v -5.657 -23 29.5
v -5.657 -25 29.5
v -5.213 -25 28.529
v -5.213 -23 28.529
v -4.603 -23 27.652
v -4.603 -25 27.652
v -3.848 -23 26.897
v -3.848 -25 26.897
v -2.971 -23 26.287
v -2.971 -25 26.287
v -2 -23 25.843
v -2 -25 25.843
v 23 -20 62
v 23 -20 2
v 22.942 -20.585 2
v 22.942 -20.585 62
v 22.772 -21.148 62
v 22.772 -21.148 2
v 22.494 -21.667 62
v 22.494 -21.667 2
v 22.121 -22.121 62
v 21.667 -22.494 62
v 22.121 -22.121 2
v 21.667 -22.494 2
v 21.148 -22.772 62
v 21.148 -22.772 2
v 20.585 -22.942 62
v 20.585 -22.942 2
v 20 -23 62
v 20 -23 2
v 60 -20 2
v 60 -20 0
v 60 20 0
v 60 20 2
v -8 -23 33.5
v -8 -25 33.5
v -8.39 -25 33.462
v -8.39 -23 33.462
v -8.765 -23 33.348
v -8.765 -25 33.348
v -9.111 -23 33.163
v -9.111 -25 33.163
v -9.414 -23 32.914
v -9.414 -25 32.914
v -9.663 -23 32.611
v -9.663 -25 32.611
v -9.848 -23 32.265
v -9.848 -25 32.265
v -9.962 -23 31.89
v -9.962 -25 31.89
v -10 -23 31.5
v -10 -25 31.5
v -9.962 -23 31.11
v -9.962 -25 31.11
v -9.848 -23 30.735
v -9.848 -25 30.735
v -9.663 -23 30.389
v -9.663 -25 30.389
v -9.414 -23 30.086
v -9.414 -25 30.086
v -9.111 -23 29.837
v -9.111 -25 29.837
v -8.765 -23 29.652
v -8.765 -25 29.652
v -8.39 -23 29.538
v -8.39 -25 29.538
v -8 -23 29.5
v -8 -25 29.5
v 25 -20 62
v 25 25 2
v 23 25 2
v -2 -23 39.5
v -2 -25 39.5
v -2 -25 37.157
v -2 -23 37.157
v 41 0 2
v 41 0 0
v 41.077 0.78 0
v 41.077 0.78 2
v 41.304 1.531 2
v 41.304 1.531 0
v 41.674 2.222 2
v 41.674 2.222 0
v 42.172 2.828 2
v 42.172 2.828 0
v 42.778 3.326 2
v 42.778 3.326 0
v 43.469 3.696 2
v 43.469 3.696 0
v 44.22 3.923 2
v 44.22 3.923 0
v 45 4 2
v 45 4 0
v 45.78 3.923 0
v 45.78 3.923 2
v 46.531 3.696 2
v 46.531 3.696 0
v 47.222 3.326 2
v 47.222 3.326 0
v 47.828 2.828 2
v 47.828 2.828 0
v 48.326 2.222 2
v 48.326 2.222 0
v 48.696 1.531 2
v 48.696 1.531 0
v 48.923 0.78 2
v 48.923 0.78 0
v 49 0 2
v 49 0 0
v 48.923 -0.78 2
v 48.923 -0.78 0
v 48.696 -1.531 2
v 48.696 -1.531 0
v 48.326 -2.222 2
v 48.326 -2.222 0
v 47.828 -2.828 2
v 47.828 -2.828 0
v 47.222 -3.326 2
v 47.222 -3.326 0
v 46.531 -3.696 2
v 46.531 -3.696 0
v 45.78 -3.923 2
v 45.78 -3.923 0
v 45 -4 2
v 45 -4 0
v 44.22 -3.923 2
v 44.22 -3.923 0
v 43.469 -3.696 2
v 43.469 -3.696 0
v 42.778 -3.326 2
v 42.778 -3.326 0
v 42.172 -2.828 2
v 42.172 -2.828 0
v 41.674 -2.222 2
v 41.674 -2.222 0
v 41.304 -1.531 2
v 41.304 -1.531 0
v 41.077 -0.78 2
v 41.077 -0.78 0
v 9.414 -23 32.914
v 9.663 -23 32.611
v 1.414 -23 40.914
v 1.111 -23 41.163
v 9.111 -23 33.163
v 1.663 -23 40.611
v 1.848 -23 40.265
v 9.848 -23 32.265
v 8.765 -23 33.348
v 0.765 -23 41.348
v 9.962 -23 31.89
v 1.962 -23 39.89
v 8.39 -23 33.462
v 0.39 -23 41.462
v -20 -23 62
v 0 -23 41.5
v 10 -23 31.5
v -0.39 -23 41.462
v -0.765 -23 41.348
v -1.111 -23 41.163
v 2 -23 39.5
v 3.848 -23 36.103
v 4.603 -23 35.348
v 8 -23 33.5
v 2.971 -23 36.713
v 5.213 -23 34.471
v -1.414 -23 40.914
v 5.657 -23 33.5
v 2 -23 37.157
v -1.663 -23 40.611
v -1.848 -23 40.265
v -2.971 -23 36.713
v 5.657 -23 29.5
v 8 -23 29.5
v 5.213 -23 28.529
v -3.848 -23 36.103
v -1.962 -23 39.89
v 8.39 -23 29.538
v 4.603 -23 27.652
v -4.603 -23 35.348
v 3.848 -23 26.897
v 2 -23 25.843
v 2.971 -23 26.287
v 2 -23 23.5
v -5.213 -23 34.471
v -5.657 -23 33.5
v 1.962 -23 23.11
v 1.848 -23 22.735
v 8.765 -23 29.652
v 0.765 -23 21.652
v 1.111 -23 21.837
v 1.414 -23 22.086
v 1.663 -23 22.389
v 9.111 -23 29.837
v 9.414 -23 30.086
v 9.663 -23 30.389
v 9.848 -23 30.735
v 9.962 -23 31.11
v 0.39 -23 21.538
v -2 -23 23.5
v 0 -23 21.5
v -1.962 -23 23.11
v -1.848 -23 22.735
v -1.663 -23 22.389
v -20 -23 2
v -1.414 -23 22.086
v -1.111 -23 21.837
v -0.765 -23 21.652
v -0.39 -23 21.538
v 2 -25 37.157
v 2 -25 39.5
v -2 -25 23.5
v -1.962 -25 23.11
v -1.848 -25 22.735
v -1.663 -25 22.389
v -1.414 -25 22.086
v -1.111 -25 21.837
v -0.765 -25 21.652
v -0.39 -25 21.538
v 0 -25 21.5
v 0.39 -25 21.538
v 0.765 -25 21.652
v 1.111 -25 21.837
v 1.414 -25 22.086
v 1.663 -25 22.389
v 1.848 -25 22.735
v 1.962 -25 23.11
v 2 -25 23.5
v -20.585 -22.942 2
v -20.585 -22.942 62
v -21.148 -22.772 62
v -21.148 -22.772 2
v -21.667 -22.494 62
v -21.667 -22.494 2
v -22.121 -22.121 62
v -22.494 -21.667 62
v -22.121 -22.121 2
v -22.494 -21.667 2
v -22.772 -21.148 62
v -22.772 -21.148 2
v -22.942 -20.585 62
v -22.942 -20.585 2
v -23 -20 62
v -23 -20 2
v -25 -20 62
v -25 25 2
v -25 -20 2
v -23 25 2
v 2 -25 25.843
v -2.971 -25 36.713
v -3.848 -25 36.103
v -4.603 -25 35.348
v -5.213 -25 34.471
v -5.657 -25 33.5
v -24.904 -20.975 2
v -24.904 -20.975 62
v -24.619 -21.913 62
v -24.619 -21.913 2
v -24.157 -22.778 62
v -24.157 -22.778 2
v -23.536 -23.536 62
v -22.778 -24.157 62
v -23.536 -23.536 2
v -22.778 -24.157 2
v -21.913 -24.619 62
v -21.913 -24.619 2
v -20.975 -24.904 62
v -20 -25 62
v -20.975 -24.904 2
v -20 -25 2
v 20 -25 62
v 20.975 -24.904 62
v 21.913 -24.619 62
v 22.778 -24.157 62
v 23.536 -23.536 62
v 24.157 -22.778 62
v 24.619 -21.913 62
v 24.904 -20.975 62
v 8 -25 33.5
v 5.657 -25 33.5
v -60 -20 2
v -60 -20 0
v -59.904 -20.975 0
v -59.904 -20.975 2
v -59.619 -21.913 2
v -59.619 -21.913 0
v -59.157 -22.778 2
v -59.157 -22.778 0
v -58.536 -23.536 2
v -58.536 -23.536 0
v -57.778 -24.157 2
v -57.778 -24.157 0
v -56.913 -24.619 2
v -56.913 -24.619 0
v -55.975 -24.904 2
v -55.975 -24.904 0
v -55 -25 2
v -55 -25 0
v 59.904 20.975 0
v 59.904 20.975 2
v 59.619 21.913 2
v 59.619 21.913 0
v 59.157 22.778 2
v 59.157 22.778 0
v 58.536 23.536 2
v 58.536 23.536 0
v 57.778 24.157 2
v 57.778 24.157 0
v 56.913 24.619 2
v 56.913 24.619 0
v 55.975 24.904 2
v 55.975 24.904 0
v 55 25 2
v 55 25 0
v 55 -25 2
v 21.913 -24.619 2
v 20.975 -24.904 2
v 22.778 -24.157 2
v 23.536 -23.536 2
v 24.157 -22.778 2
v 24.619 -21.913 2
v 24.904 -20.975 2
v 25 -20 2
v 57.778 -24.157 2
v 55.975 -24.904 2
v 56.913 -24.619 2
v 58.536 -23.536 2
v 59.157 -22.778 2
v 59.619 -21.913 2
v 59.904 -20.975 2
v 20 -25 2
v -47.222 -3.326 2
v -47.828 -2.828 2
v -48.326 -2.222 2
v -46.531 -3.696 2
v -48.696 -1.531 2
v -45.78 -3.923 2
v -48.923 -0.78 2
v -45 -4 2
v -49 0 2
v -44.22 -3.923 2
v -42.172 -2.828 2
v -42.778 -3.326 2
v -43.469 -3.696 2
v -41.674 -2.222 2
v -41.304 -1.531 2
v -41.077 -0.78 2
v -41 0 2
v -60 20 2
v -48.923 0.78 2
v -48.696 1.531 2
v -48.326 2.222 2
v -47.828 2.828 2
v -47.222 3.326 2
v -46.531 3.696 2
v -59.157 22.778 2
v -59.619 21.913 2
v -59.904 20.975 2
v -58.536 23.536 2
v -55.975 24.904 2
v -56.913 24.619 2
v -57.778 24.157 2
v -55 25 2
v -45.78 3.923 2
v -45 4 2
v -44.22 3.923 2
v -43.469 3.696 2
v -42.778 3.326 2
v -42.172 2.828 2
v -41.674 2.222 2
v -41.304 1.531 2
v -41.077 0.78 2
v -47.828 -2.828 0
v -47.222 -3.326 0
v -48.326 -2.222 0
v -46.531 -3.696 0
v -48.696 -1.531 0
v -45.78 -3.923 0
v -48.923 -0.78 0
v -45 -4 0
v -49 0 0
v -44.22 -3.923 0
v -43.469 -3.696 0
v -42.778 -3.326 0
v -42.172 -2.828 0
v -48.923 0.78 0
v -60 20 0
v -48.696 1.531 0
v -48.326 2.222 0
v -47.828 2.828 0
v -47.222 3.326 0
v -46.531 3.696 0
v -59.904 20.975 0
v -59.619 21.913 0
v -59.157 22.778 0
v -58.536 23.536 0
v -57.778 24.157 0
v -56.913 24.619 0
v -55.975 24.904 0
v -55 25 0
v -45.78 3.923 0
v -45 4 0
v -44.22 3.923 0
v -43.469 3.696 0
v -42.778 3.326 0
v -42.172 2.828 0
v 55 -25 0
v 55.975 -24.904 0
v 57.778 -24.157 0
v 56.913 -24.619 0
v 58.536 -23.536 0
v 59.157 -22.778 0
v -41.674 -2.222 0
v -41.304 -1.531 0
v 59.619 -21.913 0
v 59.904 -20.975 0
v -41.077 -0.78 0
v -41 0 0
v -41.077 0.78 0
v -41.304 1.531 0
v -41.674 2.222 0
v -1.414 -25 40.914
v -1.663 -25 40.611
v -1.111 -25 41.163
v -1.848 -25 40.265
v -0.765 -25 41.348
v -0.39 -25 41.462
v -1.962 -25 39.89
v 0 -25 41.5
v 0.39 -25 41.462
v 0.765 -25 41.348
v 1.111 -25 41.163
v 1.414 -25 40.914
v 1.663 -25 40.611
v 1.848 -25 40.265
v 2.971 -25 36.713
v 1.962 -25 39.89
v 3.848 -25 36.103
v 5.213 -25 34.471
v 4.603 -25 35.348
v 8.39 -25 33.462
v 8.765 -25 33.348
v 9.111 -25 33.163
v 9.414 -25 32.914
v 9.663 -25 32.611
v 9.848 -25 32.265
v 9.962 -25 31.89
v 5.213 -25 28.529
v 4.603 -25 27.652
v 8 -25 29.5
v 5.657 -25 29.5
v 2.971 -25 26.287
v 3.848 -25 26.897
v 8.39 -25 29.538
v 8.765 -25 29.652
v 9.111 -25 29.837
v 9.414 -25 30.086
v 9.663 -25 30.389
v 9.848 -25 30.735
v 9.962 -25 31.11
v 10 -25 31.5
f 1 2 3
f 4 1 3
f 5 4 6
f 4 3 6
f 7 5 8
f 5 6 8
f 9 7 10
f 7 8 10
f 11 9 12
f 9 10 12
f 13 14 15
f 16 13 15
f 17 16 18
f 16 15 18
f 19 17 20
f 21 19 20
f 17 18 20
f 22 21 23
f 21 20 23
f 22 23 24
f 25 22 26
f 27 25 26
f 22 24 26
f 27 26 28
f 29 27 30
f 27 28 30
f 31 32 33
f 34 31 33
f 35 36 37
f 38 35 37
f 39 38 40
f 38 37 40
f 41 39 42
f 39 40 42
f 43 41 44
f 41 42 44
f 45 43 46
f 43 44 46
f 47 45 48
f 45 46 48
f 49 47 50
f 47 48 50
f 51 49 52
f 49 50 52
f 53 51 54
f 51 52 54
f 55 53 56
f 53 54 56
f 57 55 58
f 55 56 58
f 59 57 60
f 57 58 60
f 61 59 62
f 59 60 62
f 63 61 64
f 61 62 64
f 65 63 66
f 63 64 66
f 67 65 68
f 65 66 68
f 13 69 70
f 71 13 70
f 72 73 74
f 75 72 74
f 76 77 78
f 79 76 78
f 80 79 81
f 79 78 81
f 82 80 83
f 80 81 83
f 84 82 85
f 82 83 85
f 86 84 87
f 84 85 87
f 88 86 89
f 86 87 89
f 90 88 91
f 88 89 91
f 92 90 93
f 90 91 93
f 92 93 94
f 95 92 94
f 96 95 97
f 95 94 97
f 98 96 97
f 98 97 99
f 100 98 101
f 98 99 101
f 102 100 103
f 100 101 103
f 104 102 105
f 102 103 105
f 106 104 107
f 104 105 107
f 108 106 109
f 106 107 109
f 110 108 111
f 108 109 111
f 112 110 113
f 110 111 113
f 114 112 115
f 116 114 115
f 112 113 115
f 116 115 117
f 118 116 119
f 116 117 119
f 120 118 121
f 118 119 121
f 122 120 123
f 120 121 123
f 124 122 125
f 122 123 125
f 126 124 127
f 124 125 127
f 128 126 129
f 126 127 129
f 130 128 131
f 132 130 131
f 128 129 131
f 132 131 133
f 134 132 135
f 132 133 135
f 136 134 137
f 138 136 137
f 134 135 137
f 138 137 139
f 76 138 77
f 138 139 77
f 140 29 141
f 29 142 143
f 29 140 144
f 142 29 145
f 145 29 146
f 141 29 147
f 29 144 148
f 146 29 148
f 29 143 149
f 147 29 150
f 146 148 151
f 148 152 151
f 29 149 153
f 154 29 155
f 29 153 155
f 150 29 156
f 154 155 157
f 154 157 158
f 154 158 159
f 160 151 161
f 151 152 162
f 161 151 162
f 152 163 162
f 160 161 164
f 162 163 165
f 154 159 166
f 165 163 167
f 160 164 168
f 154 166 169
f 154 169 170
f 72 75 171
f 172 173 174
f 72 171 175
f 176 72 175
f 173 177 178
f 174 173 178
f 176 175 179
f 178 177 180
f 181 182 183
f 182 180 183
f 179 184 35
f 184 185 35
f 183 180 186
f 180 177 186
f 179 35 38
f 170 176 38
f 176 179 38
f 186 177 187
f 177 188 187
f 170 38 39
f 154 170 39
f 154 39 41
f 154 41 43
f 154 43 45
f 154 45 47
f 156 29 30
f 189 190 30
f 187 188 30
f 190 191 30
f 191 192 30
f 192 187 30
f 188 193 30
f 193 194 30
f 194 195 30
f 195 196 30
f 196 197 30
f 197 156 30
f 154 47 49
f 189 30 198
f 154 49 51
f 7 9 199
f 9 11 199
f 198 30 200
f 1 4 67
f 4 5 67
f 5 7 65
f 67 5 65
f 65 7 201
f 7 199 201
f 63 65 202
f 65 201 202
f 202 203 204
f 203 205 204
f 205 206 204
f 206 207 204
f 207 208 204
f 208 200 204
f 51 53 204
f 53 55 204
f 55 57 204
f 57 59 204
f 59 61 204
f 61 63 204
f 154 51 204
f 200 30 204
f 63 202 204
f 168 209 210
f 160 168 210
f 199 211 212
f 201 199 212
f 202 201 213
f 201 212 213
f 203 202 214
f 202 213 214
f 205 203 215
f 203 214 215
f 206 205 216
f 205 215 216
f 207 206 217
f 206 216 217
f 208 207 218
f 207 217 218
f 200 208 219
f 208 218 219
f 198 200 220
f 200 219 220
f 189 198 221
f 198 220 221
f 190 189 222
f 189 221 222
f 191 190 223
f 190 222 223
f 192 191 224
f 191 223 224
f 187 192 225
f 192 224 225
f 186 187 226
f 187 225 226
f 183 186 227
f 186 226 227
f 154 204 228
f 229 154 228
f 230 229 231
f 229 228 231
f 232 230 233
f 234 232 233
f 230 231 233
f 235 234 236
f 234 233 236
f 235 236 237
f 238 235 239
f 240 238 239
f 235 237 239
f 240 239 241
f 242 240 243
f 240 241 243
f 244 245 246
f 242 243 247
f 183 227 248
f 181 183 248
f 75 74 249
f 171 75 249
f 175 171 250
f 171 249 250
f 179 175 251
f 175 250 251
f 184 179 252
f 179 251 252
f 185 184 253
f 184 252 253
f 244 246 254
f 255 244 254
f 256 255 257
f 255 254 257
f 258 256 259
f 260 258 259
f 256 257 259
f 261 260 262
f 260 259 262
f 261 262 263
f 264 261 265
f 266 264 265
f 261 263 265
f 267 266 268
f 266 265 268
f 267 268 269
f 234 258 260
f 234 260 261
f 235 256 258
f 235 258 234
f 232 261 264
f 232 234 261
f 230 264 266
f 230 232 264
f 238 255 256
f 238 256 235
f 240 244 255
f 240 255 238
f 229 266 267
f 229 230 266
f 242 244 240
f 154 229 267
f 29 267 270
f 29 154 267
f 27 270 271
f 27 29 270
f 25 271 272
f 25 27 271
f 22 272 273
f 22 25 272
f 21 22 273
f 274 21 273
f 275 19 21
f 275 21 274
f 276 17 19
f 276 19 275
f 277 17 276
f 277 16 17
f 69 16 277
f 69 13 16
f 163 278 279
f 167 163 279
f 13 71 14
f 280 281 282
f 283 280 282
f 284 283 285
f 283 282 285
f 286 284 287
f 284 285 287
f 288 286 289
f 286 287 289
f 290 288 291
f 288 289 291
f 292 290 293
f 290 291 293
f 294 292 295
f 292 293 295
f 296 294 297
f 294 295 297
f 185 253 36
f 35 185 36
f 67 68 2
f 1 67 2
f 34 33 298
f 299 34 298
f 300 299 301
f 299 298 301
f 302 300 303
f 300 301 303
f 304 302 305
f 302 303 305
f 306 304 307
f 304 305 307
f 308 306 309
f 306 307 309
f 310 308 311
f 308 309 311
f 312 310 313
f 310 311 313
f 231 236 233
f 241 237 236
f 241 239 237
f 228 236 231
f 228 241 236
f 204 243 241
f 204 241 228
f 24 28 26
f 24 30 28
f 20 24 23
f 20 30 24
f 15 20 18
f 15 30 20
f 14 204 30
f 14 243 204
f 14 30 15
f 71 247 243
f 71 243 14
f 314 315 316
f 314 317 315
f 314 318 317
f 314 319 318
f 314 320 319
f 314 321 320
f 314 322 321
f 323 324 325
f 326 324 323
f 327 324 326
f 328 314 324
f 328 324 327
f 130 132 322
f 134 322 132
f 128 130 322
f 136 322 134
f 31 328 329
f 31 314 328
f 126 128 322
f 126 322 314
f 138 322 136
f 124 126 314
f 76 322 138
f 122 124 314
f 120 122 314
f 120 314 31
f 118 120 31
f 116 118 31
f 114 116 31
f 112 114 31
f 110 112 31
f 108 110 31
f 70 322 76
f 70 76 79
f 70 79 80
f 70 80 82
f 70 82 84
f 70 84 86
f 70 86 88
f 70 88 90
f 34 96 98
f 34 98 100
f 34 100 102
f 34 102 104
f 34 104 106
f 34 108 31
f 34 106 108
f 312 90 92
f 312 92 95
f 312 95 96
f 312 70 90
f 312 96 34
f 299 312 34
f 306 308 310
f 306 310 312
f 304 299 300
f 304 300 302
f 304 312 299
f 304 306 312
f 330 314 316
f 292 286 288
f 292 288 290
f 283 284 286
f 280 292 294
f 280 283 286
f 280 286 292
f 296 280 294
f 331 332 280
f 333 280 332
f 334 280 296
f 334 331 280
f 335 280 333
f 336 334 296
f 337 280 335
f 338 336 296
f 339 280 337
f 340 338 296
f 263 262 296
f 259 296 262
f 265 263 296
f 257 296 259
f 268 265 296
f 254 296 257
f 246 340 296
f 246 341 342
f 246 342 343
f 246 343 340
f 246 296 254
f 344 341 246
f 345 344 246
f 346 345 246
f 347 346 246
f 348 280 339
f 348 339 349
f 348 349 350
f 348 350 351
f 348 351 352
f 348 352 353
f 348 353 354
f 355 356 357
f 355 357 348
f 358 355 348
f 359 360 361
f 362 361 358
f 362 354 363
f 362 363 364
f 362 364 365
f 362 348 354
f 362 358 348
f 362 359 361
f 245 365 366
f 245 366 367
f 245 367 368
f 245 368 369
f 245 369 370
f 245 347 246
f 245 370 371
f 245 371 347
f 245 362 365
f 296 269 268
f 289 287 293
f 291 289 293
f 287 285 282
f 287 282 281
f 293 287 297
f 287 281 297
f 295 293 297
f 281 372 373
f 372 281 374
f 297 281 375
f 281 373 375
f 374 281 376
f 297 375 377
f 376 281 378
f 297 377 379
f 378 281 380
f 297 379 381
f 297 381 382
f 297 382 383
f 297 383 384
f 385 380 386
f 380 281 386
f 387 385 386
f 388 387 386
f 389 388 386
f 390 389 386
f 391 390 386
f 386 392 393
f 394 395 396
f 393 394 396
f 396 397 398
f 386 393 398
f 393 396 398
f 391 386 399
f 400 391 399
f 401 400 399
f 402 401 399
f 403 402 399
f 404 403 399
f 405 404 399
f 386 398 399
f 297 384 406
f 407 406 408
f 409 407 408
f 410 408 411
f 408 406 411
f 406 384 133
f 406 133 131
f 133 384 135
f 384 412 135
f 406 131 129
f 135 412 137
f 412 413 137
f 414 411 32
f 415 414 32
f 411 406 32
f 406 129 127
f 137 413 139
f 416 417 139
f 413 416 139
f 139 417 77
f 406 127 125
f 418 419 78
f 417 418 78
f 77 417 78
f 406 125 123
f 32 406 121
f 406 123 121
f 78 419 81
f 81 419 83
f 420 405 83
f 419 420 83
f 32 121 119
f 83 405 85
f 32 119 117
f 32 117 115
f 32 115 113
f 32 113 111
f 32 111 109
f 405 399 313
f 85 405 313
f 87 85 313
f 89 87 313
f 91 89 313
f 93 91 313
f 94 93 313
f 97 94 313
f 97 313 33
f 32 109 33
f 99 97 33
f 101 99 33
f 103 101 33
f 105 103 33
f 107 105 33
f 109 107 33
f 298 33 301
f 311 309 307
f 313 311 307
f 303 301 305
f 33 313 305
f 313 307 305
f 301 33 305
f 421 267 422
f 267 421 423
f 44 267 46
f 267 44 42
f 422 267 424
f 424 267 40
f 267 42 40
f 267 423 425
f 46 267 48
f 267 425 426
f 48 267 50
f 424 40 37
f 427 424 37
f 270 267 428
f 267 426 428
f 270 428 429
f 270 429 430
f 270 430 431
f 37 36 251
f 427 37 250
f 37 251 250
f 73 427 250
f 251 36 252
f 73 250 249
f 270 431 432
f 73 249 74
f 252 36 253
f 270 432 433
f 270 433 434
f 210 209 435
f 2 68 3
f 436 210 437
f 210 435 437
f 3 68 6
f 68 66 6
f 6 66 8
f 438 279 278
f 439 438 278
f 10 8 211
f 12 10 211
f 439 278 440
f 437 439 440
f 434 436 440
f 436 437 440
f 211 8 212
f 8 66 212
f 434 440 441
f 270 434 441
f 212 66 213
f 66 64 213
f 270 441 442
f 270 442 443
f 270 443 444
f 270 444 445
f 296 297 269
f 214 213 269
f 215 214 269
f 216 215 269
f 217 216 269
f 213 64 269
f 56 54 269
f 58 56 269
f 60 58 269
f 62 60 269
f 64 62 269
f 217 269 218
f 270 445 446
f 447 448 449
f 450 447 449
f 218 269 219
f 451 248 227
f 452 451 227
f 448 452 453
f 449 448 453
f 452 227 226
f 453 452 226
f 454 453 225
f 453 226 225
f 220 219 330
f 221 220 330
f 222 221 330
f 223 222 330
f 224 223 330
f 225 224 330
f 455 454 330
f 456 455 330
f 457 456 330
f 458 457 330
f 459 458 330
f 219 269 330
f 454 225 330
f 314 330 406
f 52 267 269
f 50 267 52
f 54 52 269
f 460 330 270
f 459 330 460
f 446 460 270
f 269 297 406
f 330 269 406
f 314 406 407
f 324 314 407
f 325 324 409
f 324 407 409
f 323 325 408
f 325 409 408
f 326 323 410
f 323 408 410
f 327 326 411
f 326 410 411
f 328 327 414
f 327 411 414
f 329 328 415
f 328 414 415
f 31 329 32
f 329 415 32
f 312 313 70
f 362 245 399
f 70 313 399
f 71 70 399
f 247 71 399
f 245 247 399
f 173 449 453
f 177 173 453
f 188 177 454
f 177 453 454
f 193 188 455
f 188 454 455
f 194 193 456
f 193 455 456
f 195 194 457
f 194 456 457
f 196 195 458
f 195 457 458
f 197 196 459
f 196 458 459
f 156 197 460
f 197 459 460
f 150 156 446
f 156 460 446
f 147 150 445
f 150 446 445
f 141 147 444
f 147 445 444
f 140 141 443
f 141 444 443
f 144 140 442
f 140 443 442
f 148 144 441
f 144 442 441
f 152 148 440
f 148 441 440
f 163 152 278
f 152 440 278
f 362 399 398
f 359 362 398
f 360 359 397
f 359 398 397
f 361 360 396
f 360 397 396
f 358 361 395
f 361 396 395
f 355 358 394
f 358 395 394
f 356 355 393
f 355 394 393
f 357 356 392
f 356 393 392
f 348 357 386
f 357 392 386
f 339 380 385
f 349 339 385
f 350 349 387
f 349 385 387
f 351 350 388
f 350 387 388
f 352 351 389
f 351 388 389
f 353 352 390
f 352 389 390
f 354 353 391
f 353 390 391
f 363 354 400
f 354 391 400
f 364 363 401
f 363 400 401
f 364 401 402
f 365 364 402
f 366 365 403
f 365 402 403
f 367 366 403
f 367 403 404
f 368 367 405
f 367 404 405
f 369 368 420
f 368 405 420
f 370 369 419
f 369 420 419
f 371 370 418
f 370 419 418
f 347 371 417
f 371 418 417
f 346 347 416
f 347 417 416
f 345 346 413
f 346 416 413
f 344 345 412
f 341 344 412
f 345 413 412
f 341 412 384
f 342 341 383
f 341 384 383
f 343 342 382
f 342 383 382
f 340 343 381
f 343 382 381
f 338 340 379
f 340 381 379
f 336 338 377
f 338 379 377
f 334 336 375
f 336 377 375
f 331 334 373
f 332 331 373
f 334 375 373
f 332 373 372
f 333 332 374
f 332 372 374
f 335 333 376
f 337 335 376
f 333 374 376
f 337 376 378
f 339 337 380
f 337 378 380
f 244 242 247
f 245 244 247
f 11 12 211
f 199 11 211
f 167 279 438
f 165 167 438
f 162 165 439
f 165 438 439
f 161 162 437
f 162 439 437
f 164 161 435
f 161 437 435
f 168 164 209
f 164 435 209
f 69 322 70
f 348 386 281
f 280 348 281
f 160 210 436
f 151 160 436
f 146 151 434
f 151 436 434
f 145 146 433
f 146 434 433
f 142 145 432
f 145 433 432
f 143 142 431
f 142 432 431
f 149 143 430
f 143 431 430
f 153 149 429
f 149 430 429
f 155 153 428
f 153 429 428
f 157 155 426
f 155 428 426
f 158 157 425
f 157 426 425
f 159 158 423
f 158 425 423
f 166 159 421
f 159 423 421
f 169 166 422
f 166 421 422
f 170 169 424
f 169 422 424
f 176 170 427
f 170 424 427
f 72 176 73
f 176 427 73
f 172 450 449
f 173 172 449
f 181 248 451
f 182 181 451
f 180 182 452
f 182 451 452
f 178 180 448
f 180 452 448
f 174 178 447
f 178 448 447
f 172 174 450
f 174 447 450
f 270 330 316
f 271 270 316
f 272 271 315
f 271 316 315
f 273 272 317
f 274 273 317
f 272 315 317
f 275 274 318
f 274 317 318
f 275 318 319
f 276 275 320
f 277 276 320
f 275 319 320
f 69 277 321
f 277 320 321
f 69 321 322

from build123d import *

# Parameters (mm, degrees)
SALIENTE_EXTRUIR1_DEPTH = 2
SALIENTE_EXTRUIR2_DEPTH = 60
CORTAR_EXTRUIR1_DEPTH   = 50
CROQUIS4_R              = 4
CORTAR_EXTRUIR2_DEPTH   = 2
CORTAR_EXTRUIR6_DEPTH   = 2


with BuildPart() as part:
    # Croquis1 → Saliente-Extruir1 (new body)
    with BuildSketch(Plane.XY):
        with BuildLine():
            Line((-55, -25), (55, -25))
            ThreePointArc((55, -25), (58.535533906, -23.535533906), (60, -20))
            Line((60, -20), (60, 20))
            ThreePointArc((60, 20), (58.535533906, 23.535533906), (55, 25))
            Line((55, 25), (-55, 25))
            ThreePointArc((-55, 25), (-58.535533906, 23.535533906), (-60, 20))
            Line((-60, 20), (-60, -20))
            ThreePointArc((-60, -20), (-58.535533906, -23.535533906), (-55, -25))
        make_face()
    extrude(amount=SALIENTE_EXTRUIR1_DEPTH)

    # Croquis2 → Saliente-Extruir2 (add)
    with BuildSketch(Plane.XY.offset(2)):
        with BuildLine():
            Line((-20, -25), (20, -25))
            ThreePointArc((20, -25), (23.535533906, -23.535533906), (25, -20))
            Line((25, -20), (25, 25))
            Line((25, 25), (23, 25))
            Line((23, 25), (23, -20))
            ThreePointArc((23, -20), (22.121320344, -22.121320344), (20, -23))
            Line((20, -23), (-20, -23))
            ThreePointArc((-20, -23), (-22.121320344, -22.121320344), (-23, -20))
            Line((-23, -20), (-23, 25))
            Line((-23, 25), (-25, 25))
            Line((-25, 25), (-25, -20))
            ThreePointArc((-25, -20), (-23.535533906, -23.535533906), (-20, -25))
        make_face()
    extrude(amount=SALIENTE_EXTRUIR2_DEPTH)

    # Croquis3 → Cortar-Extruir1 (cut)
    with BuildSketch(Plane(origin=(25, 0, 0), x_dir=(0, 0, -1), z_dir=(1, 0, 0))):
        Polygon((-62, -20), (-2, 25), (-62, 25), align=None)
    extrude(amount=-CORTAR_EXTRUIR1_DEPTH, mode=Mode.SUBTRACT)

    # Croquis4 → Cortar-Extruir2 (cut)
    with BuildSketch(Plane(origin=(0, 0, 0), x_dir=(-1, 0, 0), z_dir=(0, 0, -1))):
        with Locations((-45, 0)):
            Circle(CROQUIS4_R)
        with Locations((45, 0)):
            Circle(CROQUIS4_R)
    extrude(amount=-CORTAR_EXTRUIR2_DEPTH, mode=Mode.SUBTRACT)

    # Croquis5 → Cortar-Extruir6 (cut)
    with BuildSketch(Plane.XZ.offset(25)):
        with BuildLine():
            ThreePointArc((-2, 23.499997), (0, 21.499997), (2, 23.499997))
            Line((2, 23.499997), (2, 25.84314275))
            ThreePointArc((2, 25.84314275), (4.242640687, 27.257356313), (5.656854249, 29.499997))
            Line((5.656854249, 29.499997), (8, 29.499997))
            ThreePointArc((8, 29.499997), (10, 31.499997), (8, 33.499997))
            Line((8, 33.499997), (5.656854249, 33.499997))
            ThreePointArc((5.656854249, 33.499997), (4.242640687, 35.742637687), (2, 37.156851249))
            Line((2, 37.156851249), (2, 39.499997))
            ThreePointArc((2, 39.499997), (0, 41.499997), (-2, 39.499997))
            Line((-2, 39.499997), (-2, 37.156851249))
            ThreePointArc((-2, 37.156851249), (-4.242640687, 35.742637687), (-5.656854249, 33.499997))
            Line((-5.656854249, 33.499997), (-8, 33.499997))
            ThreePointArc((-8, 33.499997), (-10, 31.499997), (-8, 29.499997))
            Line((-8, 29.499997), (-5.656854249, 29.499997))
            ThreePointArc((-5.656854249, 29.499997), (-4.242640687, 27.257356313), (-2, 25.84314275))
            Line((-2, 25.84314275), (-2, 23.499997))
        make_face()
    extrude(amount=-CORTAR_EXTRUIR6_DEPTH, mode=Mode.SUBTRACT)


solid = part.part
